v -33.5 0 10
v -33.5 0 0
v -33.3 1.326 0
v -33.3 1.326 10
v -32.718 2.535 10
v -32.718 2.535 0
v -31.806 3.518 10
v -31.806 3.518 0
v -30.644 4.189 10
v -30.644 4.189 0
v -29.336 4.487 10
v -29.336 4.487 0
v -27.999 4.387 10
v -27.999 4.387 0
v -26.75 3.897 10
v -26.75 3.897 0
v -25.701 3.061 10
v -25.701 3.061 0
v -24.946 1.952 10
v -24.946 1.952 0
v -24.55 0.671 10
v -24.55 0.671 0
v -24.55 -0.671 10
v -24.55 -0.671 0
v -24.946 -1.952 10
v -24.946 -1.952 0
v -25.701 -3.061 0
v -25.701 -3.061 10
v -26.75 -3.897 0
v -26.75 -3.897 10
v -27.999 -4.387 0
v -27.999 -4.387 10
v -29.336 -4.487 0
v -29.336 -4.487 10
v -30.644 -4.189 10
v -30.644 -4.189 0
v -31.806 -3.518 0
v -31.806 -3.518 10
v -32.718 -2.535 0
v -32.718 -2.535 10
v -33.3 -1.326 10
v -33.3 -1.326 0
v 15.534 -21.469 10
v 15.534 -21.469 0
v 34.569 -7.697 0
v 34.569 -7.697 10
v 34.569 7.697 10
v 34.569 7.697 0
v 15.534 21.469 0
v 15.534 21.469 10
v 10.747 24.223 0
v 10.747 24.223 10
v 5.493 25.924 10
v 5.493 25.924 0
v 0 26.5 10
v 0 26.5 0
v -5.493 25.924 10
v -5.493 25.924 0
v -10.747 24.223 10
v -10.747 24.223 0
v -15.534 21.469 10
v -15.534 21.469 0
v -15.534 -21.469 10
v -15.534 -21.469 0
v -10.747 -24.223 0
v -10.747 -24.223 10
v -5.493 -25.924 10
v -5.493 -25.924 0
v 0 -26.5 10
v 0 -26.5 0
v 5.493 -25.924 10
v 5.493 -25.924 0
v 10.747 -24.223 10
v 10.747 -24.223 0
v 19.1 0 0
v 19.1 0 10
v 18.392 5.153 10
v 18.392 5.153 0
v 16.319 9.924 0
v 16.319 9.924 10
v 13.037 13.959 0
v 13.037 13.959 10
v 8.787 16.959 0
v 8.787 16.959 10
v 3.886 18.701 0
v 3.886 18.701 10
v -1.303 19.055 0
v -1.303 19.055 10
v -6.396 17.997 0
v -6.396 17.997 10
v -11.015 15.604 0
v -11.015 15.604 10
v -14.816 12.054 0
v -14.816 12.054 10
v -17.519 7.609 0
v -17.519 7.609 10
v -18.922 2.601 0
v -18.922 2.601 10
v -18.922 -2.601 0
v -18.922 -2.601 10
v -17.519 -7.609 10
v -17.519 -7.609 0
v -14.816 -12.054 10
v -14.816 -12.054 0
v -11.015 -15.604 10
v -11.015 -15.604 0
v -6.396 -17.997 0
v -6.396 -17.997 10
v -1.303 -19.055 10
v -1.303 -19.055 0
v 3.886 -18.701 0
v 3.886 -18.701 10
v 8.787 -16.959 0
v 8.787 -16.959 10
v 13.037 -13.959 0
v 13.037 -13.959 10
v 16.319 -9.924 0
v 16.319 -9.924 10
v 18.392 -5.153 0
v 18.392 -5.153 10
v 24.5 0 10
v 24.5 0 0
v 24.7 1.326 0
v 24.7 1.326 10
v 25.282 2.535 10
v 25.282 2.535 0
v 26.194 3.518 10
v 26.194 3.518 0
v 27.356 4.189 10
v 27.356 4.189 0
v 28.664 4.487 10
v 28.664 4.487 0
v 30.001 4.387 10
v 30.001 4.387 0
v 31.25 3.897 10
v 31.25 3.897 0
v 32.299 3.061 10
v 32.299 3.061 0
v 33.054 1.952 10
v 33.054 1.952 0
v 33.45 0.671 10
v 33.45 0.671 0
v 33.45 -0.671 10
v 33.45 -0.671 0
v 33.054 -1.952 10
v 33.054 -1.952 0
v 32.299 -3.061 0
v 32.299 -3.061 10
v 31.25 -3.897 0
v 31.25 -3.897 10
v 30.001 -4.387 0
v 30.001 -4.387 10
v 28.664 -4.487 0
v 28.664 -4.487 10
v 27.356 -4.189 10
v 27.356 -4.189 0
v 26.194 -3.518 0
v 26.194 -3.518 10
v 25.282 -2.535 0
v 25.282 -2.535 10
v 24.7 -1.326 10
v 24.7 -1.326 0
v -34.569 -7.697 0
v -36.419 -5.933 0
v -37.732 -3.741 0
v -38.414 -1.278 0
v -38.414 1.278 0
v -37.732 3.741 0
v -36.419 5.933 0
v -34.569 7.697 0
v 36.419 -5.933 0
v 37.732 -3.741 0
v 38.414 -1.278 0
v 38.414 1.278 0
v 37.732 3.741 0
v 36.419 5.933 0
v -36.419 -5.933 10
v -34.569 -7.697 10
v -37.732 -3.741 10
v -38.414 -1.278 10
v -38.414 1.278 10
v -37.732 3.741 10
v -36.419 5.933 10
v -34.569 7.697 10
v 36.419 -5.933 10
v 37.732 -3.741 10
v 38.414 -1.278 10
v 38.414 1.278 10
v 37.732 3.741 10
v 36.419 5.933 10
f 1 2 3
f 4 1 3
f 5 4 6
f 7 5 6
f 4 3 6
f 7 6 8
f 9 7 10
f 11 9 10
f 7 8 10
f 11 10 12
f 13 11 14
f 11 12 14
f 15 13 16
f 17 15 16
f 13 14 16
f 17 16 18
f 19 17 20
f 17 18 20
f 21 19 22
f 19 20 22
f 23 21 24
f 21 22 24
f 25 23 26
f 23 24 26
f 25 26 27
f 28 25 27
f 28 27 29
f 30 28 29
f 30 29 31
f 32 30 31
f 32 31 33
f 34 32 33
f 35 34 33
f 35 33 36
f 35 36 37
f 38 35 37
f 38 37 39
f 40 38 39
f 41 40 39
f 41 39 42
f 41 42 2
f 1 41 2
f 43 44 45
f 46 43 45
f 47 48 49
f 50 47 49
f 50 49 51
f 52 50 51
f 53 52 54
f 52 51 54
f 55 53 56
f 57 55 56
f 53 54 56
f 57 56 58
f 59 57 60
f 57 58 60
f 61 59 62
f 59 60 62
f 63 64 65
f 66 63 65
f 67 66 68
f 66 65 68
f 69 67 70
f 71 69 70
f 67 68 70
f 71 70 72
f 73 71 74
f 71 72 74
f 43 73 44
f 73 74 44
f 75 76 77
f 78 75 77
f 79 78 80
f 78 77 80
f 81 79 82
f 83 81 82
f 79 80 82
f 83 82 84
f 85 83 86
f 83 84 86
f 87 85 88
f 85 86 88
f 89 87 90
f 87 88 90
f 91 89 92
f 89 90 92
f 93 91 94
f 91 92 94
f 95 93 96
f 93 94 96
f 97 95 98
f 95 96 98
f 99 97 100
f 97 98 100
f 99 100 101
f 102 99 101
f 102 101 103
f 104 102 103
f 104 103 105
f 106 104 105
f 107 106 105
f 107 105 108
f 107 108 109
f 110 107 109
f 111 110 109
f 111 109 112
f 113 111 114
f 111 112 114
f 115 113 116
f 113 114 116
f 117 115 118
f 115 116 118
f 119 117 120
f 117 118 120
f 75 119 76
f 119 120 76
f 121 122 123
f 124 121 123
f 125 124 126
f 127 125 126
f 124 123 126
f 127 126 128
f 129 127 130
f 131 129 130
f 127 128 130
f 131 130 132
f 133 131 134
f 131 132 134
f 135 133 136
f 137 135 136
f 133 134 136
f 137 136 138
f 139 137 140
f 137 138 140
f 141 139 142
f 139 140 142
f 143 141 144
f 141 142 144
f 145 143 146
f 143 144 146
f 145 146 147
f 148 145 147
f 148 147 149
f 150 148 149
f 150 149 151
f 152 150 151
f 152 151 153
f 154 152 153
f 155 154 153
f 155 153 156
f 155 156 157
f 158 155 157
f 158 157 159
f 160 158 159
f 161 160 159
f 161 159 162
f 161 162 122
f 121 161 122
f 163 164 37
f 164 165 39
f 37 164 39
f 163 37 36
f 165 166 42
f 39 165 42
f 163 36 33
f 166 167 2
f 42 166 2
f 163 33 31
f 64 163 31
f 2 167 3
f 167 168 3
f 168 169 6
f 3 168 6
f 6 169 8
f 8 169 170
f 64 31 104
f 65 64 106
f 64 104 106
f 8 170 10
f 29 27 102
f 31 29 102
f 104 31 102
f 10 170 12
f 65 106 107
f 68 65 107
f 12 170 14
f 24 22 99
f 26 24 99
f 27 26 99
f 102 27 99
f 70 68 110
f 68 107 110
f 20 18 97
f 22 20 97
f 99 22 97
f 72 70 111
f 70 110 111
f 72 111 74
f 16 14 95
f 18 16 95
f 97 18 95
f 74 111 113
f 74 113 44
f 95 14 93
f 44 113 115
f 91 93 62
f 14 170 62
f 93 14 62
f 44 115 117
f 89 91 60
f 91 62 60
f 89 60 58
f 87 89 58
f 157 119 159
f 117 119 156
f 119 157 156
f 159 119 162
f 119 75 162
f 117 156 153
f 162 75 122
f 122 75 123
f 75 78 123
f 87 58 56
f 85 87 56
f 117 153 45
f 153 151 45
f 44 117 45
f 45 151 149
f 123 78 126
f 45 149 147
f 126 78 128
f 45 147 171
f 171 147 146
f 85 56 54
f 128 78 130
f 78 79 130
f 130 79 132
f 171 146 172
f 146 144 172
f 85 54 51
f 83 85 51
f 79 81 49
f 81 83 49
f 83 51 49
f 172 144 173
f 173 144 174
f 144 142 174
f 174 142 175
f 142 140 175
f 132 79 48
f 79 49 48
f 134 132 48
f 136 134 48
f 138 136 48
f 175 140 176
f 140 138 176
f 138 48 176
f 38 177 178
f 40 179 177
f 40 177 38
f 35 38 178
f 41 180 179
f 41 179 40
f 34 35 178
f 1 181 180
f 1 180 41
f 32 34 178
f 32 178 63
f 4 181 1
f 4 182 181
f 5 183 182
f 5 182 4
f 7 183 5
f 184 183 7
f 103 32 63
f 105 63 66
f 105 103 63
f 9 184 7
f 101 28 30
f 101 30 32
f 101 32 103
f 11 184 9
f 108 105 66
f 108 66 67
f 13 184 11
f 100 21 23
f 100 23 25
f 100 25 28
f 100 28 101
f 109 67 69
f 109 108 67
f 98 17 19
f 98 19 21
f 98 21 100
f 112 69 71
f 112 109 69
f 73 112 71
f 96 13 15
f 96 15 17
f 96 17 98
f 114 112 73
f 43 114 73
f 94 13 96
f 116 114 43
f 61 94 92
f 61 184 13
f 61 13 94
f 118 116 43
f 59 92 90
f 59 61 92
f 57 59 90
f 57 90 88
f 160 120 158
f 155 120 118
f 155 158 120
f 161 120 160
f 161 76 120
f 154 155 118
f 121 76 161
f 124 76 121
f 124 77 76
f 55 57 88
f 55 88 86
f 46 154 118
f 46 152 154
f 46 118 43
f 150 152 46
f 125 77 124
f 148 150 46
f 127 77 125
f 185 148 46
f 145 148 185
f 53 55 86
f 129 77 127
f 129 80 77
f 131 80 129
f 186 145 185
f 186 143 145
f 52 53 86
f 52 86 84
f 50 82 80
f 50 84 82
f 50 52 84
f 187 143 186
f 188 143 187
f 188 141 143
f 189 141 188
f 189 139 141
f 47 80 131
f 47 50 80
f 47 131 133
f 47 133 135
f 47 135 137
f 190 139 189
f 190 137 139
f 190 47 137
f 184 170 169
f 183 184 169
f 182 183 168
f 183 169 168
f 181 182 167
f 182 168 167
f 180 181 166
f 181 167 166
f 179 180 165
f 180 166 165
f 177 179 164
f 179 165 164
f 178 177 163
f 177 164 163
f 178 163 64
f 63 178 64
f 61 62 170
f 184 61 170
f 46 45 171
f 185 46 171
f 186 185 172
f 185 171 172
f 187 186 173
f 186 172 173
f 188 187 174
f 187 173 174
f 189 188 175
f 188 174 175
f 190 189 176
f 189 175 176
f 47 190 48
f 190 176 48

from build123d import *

# Parameters (mm, degrees)
F1_DEPTH = 10
F3_D     = 9
F4_R     = 19.1
F5_DEPTH = 10


with BuildPart() as f1:
    # F0 (on Top) → F1 (new body)
    with BuildSketch(Plane.XY):
        with BuildLine():
            Line((-15.5344827586, 21.4692767792), (-34.5689655172, 7.696533185))
            ThreePointArc((-34.5689655172, 7.696533185), (-38.5, 0), (-34.5689655172, -7.696533185))
            Line((-34.5689655172, -7.696533185), (-15.5344827586, -21.4692767792))
            ThreePointArc((-15.5344827586, -21.4692767792), (0, -26.5), (15.5344827586, -21.4692767792))
            Line((15.5344827586, -21.4692767792), (34.5689655172, -7.696533185))
            ThreePointArc((34.5689655172, -7.696533185), (38.5, 0), (34.5689655172, 7.696533185))
            Line((34.5689655172, 7.696533185), (15.5344827586, 21.4692767792))
            ThreePointArc((15.5344827586, 21.4692767792), (0, 26.5), (-15.5344827586, 21.4692767792))
        make_face()
    extrude(amount=F1_DEPTH)

    # F3 (through all)
    with Locations(Plane.XY.offset(10)):
        with Locations((-29, 0), (29, 0)):
            Hole(F3_D / 2)

    # F4 (on face) → F5 (cut, through all)
    with BuildSketch(Plane.XY.offset(10)):
        Circle(F4_R)
    extrude(amount=-F5_DEPTH, mode=Mode.SUBTRACT)


solid = f1.part
